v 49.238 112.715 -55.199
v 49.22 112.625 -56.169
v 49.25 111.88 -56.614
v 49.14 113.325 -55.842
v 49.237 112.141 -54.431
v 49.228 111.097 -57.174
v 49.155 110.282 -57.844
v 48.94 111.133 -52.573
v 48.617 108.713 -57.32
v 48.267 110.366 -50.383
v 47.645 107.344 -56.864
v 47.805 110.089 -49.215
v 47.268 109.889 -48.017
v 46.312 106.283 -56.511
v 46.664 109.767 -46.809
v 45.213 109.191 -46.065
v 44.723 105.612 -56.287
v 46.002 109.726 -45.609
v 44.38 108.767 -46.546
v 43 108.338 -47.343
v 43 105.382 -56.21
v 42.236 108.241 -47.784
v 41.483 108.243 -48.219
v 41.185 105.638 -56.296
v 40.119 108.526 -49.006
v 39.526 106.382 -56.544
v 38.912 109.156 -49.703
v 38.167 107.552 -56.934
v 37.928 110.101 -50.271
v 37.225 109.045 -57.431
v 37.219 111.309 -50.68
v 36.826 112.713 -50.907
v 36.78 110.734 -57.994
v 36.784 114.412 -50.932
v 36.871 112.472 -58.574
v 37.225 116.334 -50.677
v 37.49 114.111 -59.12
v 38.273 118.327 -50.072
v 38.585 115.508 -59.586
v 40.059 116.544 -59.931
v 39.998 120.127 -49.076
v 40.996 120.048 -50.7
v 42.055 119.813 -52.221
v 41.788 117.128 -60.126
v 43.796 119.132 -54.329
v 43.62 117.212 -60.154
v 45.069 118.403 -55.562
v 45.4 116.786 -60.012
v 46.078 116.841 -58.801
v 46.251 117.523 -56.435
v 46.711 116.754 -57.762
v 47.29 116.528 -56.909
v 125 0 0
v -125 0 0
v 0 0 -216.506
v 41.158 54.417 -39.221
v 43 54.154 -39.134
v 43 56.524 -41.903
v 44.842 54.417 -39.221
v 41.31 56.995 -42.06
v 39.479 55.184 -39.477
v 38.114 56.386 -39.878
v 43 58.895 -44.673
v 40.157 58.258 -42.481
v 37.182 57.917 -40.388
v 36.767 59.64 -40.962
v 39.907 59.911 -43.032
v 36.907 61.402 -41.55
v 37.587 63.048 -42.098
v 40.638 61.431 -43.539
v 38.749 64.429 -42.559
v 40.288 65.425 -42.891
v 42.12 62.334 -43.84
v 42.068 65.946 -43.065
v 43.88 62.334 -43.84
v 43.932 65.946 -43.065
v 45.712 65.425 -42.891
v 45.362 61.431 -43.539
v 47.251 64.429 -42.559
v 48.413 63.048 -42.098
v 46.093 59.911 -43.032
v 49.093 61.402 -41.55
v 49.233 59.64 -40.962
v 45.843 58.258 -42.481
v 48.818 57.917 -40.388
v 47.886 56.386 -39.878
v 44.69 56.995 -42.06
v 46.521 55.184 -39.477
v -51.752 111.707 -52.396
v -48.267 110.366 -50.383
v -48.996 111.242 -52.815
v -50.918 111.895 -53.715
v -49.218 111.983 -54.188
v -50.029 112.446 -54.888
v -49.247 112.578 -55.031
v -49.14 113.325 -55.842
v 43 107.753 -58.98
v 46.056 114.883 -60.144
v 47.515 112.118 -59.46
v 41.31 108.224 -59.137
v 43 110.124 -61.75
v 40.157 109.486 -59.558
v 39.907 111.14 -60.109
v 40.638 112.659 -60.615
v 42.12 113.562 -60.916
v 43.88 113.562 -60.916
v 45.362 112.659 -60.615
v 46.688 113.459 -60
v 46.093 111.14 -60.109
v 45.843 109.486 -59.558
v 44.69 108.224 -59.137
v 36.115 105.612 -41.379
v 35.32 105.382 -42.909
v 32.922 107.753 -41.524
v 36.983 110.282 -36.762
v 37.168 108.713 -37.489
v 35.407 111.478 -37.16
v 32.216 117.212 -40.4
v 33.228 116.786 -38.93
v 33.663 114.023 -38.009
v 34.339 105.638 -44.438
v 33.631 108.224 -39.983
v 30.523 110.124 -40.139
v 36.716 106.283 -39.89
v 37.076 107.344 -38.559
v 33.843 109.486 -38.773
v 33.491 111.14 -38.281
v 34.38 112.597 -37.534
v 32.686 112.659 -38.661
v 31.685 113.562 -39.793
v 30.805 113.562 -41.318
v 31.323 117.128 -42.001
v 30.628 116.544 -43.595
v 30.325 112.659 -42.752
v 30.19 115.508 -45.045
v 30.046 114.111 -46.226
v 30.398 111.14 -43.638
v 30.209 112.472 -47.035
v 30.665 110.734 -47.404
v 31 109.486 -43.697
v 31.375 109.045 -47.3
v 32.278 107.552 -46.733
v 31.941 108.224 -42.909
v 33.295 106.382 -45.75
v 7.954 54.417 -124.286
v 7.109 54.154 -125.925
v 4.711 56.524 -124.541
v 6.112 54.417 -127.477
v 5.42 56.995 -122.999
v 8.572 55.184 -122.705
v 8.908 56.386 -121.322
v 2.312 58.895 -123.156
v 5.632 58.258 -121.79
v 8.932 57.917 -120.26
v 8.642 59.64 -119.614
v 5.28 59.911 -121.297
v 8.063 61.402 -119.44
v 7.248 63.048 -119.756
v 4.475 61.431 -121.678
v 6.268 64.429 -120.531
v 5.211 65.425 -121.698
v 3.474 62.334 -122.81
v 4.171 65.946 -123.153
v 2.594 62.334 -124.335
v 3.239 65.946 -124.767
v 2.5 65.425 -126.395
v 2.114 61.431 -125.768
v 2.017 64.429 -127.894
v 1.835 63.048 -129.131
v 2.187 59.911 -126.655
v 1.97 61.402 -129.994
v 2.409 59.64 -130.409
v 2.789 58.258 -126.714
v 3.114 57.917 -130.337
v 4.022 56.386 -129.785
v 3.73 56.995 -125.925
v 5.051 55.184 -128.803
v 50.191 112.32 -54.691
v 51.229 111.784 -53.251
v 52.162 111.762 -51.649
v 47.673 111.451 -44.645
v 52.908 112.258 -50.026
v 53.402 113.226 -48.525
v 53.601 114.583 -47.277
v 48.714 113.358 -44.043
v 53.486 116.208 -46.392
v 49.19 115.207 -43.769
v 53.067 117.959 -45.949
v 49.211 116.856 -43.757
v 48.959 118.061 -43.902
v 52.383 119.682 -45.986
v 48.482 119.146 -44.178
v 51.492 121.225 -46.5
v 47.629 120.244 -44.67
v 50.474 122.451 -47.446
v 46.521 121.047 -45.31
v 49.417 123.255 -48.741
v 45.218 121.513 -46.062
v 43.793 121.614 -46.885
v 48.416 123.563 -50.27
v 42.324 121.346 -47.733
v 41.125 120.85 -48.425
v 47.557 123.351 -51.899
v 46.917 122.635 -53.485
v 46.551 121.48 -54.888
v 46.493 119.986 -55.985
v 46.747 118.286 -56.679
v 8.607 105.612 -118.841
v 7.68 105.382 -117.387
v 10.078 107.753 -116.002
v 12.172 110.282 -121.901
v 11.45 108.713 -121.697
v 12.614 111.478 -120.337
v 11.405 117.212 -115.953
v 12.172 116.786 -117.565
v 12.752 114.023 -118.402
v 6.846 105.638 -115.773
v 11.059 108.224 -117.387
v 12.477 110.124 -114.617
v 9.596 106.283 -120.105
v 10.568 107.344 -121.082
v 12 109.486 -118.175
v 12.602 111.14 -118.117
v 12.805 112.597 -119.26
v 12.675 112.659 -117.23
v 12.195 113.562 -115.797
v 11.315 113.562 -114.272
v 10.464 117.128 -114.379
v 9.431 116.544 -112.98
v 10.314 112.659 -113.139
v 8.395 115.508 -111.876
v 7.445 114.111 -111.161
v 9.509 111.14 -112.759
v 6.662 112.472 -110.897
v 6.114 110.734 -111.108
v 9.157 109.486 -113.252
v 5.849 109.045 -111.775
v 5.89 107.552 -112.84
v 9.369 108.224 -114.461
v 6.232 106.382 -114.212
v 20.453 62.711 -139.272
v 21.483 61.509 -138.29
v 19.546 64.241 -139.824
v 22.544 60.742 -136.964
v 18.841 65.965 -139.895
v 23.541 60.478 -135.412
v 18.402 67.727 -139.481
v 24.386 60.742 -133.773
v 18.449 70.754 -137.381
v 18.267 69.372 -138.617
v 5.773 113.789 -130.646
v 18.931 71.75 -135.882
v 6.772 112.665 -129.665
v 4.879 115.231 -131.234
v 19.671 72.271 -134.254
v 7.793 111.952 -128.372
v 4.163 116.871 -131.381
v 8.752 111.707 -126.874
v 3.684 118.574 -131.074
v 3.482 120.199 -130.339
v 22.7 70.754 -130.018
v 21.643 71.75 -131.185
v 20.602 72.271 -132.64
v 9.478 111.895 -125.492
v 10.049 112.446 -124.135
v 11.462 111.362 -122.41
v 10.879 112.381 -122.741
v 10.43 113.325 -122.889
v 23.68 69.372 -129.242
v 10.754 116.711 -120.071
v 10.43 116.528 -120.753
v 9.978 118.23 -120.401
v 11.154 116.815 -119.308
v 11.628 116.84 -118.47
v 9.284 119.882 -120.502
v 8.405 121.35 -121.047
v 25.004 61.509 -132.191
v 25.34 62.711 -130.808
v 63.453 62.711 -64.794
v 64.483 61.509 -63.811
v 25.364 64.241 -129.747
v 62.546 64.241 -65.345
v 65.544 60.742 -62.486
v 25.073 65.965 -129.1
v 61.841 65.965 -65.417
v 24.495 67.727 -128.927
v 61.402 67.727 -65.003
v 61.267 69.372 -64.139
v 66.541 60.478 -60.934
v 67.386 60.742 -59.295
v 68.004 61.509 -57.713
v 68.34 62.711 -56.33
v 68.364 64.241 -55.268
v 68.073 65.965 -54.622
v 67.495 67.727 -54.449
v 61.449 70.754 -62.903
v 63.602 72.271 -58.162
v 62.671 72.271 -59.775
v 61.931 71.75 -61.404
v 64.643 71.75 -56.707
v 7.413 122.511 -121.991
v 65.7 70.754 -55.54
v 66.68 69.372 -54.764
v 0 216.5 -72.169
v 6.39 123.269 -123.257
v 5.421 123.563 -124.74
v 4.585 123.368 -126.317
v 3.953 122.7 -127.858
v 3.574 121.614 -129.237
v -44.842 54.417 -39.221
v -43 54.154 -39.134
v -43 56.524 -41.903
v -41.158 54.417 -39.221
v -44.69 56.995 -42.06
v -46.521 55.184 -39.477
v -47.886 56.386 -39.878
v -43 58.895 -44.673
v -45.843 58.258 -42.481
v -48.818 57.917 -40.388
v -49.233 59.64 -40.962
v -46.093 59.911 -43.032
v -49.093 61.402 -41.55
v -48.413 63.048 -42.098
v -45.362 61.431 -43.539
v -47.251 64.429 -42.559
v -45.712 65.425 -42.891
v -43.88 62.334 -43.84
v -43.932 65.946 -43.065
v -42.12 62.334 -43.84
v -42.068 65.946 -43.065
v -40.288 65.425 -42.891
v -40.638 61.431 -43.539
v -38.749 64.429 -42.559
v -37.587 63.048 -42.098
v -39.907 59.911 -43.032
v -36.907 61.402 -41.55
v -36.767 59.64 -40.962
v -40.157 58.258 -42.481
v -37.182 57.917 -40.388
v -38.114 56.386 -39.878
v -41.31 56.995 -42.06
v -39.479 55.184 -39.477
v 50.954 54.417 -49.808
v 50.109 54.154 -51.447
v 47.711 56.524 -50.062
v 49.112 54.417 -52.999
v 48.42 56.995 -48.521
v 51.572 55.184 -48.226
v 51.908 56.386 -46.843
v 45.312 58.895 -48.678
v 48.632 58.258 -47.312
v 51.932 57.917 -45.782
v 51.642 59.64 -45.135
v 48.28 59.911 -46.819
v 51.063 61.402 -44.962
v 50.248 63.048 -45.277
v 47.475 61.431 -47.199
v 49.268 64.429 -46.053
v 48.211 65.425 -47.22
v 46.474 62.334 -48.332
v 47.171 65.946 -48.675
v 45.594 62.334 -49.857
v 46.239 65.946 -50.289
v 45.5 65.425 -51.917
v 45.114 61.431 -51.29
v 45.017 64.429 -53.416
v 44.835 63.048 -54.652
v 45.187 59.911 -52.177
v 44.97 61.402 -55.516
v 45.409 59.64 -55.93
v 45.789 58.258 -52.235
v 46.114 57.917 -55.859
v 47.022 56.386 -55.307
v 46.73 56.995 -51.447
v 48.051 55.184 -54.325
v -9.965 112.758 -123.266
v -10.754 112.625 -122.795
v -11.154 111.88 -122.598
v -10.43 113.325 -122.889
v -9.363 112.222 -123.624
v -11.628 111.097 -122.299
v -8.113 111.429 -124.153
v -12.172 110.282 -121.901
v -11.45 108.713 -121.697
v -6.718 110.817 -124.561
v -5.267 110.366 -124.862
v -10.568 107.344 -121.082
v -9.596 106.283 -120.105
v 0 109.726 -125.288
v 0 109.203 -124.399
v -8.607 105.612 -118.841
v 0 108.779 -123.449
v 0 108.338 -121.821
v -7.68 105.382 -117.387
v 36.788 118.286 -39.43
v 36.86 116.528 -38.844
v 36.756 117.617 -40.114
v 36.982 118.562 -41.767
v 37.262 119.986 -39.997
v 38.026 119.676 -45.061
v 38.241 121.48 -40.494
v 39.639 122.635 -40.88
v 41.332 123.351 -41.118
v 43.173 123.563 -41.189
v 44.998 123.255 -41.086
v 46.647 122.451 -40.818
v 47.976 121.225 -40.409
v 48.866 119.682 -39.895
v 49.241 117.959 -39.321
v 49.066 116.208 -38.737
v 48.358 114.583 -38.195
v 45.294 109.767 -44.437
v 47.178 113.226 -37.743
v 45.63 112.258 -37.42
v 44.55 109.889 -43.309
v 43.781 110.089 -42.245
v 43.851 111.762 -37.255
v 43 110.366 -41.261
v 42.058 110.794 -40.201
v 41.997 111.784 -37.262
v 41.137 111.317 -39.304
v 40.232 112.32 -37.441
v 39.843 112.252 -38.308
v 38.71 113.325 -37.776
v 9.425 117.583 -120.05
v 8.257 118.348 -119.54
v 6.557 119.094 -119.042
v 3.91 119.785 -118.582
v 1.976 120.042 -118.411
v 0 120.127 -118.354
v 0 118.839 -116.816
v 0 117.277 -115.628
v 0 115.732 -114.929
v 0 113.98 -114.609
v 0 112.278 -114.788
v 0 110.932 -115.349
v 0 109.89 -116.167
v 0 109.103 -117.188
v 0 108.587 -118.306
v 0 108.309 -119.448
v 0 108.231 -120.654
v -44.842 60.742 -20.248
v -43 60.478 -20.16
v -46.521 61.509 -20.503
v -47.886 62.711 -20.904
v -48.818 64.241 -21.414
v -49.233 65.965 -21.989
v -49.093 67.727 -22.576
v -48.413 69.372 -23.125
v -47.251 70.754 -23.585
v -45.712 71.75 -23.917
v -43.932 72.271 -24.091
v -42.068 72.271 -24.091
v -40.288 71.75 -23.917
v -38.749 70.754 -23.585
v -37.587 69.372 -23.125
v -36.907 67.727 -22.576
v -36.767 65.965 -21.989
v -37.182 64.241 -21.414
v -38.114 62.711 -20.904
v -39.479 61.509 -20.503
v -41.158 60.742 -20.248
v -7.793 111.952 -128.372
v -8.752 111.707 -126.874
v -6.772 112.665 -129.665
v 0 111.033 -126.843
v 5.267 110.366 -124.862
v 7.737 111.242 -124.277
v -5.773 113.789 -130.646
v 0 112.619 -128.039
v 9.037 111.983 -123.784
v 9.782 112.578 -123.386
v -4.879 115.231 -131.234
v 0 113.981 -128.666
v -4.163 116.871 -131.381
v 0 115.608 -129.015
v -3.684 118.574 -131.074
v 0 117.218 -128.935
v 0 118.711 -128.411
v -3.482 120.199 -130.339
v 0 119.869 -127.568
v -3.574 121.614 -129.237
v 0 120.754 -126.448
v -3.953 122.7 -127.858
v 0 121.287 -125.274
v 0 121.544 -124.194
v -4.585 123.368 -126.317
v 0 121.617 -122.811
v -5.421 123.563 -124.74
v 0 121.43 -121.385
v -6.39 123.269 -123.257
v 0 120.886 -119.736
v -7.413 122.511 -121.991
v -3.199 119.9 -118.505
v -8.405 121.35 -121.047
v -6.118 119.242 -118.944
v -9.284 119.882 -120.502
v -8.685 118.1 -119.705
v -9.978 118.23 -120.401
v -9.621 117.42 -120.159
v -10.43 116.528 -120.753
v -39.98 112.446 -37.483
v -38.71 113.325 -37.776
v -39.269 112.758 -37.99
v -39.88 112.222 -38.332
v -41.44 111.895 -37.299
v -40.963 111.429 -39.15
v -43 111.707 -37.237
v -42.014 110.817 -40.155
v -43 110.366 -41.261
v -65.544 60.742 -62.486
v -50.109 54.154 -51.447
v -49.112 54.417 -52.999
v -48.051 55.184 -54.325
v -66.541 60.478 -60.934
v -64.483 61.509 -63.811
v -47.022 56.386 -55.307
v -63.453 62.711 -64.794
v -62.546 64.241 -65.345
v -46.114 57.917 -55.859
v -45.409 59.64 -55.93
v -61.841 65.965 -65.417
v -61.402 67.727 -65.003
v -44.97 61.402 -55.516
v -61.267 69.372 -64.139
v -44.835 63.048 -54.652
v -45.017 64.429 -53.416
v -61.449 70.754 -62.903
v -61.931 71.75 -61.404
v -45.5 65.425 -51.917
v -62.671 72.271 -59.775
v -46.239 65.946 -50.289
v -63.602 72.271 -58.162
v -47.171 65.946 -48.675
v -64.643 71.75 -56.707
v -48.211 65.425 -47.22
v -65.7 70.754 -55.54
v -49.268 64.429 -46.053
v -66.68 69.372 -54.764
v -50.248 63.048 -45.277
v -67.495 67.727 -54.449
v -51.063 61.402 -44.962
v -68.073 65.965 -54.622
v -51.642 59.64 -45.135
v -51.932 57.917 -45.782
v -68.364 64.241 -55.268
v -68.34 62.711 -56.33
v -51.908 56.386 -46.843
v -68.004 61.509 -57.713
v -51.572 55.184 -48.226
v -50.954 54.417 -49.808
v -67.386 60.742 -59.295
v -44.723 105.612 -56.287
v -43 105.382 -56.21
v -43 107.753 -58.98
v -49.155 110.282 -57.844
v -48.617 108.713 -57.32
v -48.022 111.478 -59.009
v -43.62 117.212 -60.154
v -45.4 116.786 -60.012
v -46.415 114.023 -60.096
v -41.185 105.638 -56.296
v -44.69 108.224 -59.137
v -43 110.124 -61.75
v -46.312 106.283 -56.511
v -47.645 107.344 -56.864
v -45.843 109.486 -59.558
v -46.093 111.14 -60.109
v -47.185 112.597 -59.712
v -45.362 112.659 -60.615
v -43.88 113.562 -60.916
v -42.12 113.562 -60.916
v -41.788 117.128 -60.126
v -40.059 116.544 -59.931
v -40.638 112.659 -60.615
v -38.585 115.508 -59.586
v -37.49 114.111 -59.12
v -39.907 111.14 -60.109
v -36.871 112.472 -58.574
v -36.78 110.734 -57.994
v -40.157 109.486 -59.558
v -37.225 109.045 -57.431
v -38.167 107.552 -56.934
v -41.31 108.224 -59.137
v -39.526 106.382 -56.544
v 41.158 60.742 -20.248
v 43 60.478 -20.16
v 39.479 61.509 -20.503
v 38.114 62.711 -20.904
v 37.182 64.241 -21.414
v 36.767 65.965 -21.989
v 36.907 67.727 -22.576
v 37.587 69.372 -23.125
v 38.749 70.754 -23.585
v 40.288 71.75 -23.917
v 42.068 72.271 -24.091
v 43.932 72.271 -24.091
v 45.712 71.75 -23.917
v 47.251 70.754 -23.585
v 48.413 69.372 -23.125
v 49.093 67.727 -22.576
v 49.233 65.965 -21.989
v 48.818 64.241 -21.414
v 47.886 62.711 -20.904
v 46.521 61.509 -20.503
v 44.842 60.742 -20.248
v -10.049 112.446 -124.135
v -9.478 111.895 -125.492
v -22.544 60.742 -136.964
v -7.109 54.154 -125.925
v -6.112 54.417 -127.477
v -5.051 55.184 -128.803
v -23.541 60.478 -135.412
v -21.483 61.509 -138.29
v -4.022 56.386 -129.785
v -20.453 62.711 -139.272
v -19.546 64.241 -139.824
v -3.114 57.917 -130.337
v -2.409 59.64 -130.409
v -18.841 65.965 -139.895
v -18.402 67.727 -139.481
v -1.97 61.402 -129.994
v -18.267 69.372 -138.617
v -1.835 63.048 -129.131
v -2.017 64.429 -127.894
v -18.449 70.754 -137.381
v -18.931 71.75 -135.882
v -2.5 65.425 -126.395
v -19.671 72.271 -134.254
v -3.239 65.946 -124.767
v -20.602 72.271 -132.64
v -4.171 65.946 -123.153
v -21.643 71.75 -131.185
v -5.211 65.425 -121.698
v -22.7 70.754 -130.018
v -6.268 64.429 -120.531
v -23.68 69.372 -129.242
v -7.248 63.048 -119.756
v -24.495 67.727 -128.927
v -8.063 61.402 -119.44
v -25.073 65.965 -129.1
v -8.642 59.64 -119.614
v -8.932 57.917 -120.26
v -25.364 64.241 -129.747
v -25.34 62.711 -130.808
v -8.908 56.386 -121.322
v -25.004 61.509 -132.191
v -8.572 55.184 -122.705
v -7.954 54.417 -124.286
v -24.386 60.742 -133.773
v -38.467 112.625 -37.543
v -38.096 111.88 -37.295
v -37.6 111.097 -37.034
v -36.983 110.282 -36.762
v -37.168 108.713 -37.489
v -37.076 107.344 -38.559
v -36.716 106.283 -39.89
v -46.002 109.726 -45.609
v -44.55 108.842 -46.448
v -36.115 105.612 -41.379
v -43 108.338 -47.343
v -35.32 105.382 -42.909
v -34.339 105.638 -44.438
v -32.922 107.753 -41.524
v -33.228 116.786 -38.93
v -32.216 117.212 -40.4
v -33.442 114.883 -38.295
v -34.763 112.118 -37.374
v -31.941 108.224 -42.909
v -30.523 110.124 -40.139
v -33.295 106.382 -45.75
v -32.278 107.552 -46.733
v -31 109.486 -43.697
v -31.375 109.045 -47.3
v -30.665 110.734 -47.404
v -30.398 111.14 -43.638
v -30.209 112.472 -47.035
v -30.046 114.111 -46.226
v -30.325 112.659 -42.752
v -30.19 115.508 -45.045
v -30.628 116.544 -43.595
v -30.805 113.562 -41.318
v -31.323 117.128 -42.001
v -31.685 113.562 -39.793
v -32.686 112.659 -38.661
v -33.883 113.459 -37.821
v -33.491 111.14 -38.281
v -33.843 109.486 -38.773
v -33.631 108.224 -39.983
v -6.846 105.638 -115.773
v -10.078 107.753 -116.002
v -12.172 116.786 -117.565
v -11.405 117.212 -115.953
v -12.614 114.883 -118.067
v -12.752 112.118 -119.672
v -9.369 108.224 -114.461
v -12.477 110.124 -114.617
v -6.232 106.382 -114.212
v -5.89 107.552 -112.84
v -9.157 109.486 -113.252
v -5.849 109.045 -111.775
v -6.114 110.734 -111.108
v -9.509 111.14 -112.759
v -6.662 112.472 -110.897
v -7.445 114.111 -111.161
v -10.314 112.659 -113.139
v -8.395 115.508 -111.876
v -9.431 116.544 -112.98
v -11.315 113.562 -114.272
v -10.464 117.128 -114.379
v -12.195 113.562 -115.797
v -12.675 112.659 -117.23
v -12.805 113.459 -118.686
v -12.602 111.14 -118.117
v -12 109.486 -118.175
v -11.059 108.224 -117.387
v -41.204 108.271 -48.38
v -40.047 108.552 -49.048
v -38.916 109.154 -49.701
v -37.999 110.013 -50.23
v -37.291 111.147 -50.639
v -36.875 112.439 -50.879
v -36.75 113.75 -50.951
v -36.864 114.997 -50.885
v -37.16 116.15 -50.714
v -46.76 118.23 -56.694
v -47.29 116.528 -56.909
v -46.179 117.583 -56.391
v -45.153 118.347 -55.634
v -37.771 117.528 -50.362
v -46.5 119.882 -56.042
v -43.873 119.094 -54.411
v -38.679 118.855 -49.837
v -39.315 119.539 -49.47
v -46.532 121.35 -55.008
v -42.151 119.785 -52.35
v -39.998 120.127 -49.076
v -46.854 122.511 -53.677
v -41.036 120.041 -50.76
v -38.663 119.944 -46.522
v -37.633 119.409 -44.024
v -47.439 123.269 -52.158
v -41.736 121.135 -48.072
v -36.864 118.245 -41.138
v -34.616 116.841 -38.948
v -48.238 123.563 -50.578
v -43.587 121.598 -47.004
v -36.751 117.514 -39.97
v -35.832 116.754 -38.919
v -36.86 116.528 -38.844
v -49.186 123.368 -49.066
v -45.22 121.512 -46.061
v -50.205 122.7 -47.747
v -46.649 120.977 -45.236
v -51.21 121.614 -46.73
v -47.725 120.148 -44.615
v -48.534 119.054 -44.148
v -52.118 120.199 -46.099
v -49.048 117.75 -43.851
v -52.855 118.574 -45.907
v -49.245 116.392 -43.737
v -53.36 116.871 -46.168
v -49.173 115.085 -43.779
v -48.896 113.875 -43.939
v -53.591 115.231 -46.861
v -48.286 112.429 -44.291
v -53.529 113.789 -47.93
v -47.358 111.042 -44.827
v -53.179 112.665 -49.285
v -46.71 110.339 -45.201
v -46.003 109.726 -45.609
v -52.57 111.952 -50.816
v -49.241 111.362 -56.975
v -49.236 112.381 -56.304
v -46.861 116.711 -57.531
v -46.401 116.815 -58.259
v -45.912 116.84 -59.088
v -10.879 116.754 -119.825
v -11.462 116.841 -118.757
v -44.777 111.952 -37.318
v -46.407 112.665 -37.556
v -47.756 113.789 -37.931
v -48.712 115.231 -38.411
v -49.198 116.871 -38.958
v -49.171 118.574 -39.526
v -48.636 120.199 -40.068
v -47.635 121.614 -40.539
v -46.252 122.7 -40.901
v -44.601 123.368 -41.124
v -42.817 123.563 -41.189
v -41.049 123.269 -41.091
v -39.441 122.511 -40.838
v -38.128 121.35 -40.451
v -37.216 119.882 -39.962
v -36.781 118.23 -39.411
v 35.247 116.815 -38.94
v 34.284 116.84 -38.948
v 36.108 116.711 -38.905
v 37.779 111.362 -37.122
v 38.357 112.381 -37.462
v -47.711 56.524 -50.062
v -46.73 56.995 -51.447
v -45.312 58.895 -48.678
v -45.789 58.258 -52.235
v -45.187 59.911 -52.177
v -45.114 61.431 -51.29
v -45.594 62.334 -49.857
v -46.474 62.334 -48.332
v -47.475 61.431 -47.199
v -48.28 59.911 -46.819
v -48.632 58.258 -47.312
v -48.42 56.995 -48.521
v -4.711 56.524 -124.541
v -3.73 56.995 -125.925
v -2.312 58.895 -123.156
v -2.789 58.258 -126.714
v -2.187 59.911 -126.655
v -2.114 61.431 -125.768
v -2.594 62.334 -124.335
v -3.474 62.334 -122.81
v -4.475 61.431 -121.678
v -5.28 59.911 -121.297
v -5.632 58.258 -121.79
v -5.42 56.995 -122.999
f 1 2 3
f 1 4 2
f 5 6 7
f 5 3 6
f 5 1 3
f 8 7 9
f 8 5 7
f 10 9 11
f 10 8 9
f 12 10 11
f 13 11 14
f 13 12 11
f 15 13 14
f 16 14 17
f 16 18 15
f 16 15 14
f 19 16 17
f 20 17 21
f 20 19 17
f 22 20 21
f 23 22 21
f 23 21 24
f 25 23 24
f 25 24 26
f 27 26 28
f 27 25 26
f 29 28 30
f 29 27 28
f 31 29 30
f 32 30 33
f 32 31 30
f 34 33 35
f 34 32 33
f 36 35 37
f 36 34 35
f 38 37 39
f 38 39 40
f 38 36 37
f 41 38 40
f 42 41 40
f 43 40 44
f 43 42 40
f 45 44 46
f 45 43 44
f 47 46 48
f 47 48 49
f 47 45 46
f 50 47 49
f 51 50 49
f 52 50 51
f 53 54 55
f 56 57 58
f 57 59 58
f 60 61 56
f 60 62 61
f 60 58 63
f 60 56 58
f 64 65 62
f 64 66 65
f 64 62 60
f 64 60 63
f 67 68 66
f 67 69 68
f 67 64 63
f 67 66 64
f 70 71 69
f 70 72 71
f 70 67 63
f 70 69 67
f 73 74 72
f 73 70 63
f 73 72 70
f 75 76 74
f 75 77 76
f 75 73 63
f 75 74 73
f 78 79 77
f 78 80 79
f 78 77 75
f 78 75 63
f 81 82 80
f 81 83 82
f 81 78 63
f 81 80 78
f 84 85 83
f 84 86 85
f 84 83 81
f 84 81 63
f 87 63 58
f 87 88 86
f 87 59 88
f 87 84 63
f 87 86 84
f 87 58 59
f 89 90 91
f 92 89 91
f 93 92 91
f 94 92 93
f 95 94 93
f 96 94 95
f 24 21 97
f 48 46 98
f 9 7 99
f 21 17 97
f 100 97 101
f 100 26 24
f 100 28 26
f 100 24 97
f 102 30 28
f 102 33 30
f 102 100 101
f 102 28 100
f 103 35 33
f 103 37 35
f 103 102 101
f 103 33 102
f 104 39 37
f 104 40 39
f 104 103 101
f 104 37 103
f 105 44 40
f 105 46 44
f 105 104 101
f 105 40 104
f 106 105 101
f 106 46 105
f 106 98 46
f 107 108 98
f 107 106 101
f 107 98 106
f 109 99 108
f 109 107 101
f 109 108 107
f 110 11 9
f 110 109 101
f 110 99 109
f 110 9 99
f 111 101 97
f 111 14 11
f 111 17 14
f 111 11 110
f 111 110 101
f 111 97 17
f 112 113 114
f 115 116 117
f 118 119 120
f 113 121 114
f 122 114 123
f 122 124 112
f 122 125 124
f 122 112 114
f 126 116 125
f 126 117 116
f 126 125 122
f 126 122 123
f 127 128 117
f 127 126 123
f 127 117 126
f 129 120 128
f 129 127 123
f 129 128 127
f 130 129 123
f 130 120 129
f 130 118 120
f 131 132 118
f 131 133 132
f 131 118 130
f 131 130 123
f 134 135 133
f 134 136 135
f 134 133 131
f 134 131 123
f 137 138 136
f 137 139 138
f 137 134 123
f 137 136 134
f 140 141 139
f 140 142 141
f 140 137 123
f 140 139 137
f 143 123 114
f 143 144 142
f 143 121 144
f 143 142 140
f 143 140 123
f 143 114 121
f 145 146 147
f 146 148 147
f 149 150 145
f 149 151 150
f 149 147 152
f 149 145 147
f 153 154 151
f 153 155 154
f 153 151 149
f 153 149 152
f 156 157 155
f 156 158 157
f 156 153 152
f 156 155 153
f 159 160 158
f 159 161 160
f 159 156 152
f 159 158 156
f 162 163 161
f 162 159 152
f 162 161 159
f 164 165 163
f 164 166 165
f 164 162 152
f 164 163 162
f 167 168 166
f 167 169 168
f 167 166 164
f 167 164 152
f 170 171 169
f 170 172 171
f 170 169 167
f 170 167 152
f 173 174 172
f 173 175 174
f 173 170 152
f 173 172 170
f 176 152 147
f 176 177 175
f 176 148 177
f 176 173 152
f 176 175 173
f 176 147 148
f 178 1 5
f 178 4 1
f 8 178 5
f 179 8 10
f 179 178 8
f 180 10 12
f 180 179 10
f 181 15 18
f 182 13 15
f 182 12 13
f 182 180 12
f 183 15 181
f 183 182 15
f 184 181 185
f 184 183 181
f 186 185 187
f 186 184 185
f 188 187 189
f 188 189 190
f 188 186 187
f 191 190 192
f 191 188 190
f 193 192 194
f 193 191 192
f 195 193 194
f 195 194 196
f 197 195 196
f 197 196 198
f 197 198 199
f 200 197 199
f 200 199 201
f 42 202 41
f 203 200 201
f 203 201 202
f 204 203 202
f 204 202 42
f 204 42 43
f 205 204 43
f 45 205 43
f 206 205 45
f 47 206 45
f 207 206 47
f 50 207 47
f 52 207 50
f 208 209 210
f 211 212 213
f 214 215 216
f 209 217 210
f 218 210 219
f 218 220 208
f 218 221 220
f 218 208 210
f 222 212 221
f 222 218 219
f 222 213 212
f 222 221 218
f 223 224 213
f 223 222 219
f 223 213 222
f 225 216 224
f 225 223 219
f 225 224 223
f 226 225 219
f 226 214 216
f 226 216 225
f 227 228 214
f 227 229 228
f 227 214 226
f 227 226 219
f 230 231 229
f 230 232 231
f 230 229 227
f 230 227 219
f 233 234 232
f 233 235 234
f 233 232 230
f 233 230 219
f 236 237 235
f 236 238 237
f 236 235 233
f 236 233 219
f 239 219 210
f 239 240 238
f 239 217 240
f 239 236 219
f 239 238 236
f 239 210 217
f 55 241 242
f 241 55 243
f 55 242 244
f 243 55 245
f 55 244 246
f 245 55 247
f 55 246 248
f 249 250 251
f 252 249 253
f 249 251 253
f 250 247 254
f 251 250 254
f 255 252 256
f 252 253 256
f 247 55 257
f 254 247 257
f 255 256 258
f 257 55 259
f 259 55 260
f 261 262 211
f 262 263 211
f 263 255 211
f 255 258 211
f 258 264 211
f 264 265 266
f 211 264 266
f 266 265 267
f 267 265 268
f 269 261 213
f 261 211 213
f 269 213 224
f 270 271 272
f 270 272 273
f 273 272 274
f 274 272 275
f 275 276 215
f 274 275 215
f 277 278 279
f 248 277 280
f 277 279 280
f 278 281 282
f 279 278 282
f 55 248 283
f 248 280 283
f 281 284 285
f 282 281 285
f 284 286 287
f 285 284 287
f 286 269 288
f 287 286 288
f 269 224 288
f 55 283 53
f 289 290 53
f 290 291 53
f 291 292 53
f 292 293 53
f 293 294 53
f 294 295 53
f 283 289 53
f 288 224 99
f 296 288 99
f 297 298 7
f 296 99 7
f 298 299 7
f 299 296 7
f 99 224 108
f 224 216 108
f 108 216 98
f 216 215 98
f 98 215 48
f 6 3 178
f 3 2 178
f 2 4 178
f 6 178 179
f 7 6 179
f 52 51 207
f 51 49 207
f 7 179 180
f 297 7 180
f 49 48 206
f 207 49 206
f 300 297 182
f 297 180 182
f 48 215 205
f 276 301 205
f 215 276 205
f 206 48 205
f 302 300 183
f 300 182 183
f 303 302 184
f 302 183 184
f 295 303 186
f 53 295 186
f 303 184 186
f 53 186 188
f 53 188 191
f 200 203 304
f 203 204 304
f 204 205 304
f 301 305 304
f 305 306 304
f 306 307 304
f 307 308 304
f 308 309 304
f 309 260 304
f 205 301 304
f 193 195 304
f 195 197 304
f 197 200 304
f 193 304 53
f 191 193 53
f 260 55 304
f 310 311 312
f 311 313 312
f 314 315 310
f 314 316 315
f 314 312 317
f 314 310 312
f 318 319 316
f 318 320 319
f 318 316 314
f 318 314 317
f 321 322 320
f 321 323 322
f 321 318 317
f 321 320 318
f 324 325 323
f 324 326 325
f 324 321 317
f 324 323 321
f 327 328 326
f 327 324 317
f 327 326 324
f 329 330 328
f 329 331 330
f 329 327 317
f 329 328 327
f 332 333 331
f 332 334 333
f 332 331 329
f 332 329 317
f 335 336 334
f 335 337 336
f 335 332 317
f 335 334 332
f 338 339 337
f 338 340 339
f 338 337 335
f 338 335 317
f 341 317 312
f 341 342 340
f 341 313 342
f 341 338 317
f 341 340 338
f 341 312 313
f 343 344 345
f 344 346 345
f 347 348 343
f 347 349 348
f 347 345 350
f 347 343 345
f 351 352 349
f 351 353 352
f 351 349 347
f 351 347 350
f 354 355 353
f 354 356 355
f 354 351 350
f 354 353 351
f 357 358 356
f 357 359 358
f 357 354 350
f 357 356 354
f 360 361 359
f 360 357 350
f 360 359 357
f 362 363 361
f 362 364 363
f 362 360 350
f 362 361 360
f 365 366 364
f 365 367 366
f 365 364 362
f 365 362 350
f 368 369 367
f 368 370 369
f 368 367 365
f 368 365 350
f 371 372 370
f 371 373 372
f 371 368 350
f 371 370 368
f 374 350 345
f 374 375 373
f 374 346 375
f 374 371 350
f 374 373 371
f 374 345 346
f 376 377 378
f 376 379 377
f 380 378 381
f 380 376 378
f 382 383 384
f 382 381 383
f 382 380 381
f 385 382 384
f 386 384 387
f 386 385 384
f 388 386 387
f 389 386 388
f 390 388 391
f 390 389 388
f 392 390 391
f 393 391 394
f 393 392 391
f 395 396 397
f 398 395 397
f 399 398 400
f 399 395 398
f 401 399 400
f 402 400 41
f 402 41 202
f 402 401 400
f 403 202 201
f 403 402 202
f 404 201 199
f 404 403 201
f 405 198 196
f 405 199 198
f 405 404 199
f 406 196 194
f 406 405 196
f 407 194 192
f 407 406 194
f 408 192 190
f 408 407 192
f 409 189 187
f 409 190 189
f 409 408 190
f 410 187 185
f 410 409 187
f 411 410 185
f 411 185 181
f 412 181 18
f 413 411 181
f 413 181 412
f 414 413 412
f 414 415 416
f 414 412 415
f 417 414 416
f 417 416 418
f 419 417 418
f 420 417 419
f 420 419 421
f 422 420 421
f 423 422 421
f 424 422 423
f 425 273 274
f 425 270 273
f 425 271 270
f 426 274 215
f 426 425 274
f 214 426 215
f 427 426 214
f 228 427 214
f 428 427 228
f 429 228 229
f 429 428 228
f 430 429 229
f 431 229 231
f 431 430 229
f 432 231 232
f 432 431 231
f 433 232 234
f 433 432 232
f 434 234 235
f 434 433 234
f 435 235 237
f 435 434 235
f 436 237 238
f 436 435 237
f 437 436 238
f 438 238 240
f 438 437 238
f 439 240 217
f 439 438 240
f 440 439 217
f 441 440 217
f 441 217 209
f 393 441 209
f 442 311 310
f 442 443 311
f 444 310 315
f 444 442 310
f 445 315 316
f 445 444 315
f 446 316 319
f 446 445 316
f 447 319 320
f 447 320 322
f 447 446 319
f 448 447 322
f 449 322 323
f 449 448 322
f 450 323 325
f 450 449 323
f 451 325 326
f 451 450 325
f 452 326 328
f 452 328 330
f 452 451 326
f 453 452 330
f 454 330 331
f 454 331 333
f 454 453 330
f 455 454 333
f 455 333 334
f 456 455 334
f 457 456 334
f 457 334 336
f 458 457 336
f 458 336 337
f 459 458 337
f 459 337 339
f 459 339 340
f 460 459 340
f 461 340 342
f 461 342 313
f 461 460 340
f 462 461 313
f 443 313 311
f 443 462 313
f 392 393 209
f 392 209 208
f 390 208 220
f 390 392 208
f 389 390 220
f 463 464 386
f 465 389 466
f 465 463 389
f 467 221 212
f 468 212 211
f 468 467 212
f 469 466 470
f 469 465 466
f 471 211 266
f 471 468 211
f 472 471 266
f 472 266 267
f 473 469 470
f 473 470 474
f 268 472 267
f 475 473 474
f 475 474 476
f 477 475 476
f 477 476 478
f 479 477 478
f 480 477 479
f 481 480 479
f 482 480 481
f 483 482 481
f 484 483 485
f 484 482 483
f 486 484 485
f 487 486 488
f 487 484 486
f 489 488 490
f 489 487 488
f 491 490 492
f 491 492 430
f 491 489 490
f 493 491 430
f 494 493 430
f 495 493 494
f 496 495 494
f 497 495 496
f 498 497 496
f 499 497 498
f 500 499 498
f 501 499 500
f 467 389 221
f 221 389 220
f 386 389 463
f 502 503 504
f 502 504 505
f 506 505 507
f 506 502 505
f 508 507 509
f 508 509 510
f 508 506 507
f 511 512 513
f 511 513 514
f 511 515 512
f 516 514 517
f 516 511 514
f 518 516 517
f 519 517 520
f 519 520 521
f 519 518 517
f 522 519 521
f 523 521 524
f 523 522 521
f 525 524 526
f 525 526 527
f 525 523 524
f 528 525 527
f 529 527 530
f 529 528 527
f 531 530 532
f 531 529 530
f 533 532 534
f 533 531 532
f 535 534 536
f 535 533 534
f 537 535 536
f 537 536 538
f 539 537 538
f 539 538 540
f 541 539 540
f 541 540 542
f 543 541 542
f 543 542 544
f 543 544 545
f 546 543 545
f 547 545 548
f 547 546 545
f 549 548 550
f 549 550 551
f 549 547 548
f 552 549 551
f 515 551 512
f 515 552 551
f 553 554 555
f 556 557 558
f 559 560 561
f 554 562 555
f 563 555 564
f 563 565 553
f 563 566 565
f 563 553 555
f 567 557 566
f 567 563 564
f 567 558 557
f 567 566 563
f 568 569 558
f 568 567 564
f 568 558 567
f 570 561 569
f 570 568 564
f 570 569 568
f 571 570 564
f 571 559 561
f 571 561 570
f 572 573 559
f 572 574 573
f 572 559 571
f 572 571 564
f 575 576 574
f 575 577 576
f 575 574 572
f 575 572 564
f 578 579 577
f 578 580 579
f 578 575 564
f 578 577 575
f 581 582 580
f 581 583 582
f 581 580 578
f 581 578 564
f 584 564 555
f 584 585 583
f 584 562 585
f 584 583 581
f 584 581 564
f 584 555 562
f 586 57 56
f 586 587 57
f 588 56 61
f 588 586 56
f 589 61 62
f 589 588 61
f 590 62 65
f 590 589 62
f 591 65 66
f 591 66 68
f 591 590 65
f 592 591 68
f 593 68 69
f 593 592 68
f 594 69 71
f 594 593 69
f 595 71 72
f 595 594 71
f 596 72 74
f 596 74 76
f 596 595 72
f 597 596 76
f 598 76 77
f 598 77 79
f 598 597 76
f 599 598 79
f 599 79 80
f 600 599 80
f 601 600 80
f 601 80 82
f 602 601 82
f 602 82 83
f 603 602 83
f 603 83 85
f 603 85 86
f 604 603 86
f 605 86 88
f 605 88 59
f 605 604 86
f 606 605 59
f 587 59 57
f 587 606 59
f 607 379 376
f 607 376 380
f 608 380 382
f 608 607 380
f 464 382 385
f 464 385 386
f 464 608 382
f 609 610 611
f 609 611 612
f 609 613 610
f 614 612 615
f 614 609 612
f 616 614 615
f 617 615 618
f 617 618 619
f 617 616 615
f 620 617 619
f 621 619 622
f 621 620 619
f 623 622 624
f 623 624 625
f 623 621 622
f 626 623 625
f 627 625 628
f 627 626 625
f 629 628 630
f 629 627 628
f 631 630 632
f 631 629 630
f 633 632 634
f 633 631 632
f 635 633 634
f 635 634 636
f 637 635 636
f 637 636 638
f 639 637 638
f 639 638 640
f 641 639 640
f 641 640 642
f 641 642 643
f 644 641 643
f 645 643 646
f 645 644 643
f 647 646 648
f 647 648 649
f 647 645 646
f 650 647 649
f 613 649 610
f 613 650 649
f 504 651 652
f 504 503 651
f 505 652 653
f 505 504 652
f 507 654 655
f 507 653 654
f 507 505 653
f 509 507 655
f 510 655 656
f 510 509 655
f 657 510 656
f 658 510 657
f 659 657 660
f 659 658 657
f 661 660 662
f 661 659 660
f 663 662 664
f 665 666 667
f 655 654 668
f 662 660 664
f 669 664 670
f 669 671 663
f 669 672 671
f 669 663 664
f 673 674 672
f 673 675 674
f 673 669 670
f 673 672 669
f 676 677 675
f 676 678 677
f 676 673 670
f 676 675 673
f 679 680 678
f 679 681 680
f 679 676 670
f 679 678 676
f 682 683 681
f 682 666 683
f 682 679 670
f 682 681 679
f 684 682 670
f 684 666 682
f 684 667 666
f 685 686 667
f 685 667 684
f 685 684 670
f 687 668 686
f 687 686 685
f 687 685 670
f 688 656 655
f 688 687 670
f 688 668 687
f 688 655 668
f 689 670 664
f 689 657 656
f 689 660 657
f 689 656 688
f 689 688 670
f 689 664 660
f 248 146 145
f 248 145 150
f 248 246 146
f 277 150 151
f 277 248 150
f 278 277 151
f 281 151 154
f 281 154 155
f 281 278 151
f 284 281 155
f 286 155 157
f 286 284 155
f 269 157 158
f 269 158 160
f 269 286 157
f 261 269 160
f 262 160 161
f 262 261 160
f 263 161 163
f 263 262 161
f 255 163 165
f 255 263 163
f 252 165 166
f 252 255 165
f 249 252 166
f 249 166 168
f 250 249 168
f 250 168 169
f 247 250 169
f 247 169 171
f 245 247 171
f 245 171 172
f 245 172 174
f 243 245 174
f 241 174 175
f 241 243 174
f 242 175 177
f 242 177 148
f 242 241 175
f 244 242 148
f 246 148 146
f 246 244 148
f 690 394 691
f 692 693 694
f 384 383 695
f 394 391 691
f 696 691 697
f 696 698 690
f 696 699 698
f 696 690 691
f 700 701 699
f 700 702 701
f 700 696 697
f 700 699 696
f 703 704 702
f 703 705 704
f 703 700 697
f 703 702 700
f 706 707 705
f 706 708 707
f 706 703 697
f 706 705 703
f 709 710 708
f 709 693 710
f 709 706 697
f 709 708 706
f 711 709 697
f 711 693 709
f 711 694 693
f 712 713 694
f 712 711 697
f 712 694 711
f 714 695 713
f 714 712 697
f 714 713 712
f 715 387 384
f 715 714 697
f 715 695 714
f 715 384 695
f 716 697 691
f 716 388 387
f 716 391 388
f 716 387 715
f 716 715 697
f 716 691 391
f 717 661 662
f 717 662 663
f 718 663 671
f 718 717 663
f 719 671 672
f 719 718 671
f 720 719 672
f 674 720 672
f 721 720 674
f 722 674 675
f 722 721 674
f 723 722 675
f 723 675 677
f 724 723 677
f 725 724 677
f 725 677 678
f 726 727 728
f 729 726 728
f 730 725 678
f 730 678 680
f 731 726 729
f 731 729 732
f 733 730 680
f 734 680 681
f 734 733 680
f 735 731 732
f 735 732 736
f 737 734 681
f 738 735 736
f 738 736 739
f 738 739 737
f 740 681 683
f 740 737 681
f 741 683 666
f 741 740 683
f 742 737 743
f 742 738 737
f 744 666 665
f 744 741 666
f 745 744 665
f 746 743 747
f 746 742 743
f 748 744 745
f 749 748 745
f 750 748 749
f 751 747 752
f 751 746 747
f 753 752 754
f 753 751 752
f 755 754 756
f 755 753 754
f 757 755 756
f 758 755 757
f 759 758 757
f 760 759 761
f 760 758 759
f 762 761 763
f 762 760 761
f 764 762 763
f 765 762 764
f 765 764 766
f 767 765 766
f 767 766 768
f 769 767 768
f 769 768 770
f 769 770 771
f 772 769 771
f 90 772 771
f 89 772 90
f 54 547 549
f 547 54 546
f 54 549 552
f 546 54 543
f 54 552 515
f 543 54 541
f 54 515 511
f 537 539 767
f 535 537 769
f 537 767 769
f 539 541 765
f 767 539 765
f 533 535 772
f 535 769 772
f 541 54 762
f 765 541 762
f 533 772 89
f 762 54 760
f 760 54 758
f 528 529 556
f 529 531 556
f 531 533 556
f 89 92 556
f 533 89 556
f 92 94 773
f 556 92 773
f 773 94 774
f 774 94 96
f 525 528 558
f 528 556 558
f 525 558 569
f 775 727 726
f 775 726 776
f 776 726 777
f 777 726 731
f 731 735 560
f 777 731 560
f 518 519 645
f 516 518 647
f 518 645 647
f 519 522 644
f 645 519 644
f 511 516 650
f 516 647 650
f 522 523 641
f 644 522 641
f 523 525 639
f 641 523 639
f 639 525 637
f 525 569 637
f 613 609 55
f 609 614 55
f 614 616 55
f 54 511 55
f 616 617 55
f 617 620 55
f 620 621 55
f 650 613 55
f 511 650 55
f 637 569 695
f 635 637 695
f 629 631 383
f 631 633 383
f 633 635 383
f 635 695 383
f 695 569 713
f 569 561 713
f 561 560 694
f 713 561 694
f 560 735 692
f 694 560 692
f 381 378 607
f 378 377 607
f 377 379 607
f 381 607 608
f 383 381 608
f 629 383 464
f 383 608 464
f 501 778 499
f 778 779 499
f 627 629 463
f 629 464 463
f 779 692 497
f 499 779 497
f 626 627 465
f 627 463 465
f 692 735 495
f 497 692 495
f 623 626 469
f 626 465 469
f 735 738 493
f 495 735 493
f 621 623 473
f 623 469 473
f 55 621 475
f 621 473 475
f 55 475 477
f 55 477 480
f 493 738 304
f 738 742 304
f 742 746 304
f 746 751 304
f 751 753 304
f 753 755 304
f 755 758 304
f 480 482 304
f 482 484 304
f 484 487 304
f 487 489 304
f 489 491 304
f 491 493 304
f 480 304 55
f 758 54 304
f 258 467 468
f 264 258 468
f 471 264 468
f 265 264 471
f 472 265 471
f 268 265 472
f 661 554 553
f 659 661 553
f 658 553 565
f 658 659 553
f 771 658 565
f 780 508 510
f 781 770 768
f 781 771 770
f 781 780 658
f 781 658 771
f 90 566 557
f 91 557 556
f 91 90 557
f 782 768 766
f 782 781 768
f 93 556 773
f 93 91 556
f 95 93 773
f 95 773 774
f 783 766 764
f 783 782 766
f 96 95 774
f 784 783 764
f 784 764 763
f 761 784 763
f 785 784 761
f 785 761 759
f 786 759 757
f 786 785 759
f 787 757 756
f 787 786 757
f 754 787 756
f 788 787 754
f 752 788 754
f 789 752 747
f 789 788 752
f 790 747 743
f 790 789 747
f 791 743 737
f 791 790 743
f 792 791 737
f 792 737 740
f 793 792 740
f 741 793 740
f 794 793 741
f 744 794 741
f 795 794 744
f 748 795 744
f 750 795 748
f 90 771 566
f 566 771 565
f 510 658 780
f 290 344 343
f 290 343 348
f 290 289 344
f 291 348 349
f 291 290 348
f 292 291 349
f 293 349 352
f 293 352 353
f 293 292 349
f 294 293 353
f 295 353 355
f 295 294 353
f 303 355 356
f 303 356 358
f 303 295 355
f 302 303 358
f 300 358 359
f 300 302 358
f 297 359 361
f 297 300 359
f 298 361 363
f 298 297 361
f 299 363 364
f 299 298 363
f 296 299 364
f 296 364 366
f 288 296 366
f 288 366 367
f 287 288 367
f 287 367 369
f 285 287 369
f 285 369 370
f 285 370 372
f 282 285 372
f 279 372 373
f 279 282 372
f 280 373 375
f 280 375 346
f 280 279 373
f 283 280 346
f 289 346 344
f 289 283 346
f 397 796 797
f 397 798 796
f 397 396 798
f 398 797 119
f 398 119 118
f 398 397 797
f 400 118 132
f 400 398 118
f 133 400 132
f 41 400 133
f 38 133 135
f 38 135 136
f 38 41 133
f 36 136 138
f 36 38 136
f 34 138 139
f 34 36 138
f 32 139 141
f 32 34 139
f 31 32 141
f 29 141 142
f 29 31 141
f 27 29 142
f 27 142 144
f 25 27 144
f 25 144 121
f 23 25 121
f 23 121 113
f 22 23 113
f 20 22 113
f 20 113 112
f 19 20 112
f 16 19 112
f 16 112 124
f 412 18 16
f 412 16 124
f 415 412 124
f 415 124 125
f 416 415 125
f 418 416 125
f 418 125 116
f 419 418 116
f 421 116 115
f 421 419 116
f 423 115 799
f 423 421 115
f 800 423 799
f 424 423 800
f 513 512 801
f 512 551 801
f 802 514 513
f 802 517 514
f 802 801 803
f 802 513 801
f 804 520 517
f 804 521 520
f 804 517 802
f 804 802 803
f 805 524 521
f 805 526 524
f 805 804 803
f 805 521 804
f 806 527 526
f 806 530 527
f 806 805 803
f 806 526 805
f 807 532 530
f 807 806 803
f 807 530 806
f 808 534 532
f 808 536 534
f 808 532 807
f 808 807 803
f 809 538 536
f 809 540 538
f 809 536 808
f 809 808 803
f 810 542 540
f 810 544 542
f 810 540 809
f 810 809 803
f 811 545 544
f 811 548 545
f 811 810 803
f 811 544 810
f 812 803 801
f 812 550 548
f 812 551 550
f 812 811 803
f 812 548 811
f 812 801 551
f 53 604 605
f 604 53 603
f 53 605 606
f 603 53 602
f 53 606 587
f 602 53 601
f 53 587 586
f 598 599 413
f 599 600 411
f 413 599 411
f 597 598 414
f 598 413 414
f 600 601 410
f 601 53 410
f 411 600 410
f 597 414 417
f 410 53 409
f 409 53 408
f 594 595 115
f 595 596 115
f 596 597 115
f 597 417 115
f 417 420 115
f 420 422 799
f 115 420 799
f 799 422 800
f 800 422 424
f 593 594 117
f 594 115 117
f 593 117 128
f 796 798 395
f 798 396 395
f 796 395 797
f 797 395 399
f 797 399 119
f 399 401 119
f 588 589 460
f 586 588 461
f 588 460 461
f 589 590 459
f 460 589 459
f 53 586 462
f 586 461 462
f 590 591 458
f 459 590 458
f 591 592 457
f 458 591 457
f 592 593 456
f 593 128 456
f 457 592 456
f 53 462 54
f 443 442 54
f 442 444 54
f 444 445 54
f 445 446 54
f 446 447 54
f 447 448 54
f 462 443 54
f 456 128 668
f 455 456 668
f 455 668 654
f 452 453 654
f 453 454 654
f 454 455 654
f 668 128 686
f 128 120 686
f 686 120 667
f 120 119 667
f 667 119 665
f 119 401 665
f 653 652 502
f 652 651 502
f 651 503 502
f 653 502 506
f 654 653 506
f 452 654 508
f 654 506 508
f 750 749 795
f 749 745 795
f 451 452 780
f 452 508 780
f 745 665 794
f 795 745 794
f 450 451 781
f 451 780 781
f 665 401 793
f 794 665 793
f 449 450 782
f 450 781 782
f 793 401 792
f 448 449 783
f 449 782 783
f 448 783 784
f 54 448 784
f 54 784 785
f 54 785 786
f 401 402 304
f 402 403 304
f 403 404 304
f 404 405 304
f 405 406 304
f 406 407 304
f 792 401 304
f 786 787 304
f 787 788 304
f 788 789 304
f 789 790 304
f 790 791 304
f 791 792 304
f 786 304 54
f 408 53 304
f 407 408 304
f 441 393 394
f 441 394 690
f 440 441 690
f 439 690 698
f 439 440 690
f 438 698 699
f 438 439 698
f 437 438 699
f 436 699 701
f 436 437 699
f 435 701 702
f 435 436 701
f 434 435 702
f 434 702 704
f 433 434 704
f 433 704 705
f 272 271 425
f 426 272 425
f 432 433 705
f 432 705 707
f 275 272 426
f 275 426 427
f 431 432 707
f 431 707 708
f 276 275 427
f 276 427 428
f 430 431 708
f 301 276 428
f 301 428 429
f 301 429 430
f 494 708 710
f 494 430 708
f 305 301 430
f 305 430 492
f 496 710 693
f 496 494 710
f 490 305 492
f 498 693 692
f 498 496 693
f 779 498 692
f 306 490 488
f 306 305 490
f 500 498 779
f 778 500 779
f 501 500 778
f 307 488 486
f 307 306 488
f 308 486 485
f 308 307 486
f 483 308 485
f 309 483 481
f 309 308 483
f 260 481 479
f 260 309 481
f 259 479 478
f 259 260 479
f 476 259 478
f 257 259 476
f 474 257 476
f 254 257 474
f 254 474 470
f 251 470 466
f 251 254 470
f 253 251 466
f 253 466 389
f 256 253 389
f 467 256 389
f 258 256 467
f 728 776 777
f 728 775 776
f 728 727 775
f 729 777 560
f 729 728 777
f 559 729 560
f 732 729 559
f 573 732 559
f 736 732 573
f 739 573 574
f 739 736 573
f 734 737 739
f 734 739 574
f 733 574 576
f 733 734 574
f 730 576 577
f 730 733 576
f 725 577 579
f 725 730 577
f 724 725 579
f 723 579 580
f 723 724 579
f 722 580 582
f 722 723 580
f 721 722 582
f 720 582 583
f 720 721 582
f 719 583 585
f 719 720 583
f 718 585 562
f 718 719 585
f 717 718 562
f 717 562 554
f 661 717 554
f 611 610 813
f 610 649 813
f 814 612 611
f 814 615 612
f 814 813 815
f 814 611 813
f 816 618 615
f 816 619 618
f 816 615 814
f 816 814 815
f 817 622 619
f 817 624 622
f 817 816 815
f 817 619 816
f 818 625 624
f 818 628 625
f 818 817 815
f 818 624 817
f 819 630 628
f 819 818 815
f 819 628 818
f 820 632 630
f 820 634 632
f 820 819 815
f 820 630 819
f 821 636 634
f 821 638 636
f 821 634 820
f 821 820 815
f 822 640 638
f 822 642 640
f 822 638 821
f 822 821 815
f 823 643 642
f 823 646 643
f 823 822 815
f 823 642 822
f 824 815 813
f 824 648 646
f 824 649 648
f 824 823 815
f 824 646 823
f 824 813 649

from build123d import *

# Parameters (mm, degrees)
M14X1_5_1_AT_2_COUNT     = 2
M14X1_5_1_AT_2_PITCH     = 86
M14X1_5_1_AT_3_COUNT     = 2
M14X1_5_1_AT_3_PITCH     = 101.548018198
M14X1_5_1_AT_4_COUNT     = 2
M14X1_5_1_AT_4_PITCH     = 54
PATTERN_CIRCULAR_1_COUNT = 3


with BuildPart() as part:
    # 草圖1 → 疊層拉伸1 section 0
    with BuildSketch(Plane(origin=(0, 0, 0), x_dir=(1, 0, 0), z_dir=(0, 1, 0)), mode=Mode.PRIVATE) as loft_1_s0:
        with BuildLine():
            Line((0, 0), (-125, 0))
            Line((-125, 0), (0, 216.506350946))
            Line((0, 216.506350946), (125, 0))
            Line((125, 0), (0, 0))
        make_face()
    loft([loft_1_s0.sketch, Vertex(0, 216.5, -72.168783649)])

    # 草圖3 → M14x1.5 螺紋孔1 (revolve, cut)
    with BuildSketch(Plane(origin=(-43, 117.636383872, -39.21327823), x_dir=(0, -0.9486805150951512, 0.3162361147604725), z_dir=(1, 0, 0))):
        Polygon((0, 0), (0, 23.755378869), (6.25, 20), (6.25, 0), align=None)
    m14x1_5_1 = revolve(axis=Axis((-43, 119.644483201, -33.189156959), (0, -0.31623611476047253, -0.9486805150951512)), mode=Mode.SUBTRACT)

    # M14x1.5 螺紋孔1 at 2: M14x1.5 螺紋孔1 ×2
    with Locations(*[(i * M14X1_5_1_AT_2_PITCH, 0, 0) for i in range(1, M14X1_5_1_AT_2_COUNT)]):
        add(m14x1_5_1, mode=Mode.SUBTRACT)

    # M14x1.5 螺紋孔1 at 3: M14x1.5 螺紋孔1 ×2
    with Locations(*[Vector(0.8468899888530682, -0.5044780658851046, 0.1681642881865052) * (i * M14X1_5_1_AT_3_PITCH) for i in range(1, M14X1_5_1_AT_3_COUNT)]):
        add(m14x1_5_1, mode=Mode.SUBTRACT)

    # M14x1.5 螺紋孔1 at 4: M14x1.5 螺紋孔1 ×2
    with Locations(*[Vector(0, -0.9486805150951512, 0.3162361147604726) * (i * M14X1_5_1_AT_4_PITCH) for i in range(1, M14X1_5_1_AT_4_COUNT)]):
        add(m14x1_5_1, mode=Mode.SUBTRACT)

    # 環狀複製排列1: M14x1.5 螺紋孔1 ×3 about axis
    pattern_circular_1_axis = Axis((0, 216.5, -72.168783649), (0, -1, 0))
    for i in range(1, PATTERN_CIRCULAR_1_COUNT):
        add(m14x1_5_1.rotate(pattern_circular_1_axis, i * 360 / PATTERN_CIRCULAR_1_COUNT), mode=Mode.SUBTRACT)

    # 環狀複製排列1 copy 1 sketch → 環狀複製排列1 copy 1 (revolve, cut)
    with BuildSketch(Plane(origin=(-50.040304887, 117.636383872, -51.407443995), x_dir=(-0.27386850897666026, -0.9486805150951512, -0.15811805738023615), z_dir=(-0.4999999999999998, 0, 0.8660254037844387))):
        Polygon((0, 0), (0, 23.755378869), (6.25, 20), (6.25, 0), align=None)
    revolve(axis=Axis((-55.257346943, 119.644483201, -54.419504631), (0.8215814261477076, -0.31623611476047253, 0.47434025754757536)), mode=Mode.SUBTRACT)

    # 環狀複製排列1 copy 2 sketch → 環狀複製排列1 copy 2 (revolve, cut)
    with BuildSketch(Plane(origin=(7.040304887, 117.636383872, -125.885628721), x_dir=(0.27386850897666015, -0.9486805150951512, -0.15811805738023638), z_dir=(-0.5000000000000004, 0, -0.8660254037844384))):
        Polygon((0, 0), (0, 23.755378869), (6.25, 20), (6.25, 0), align=None)
    revolve(axis=Axis((12.257346943, 119.644483201, -128.897689356), (-0.8215814261477072, -0.31623611476047253, 0.474340257547576)), mode=Mode.SUBTRACT)

    # 環狀複製排列1 copy 3 sketch → 環狀複製排列1 copy 3 (revolve, cut)
    with BuildSketch(Plane(origin=(-64.829204372, 66.407636057, -59.945819094), x_dir=(-0.27386850897666026, -0.9486805150951512, -0.15811805738023615), z_dir=(-0.4999999999999998, 0, 0.8660254037844387))):
        Polygon((0, 0), (0, 23.755378869), (6.25, 20), (6.25, 0), align=None)
    revolve(axis=Axis((-70.046246428, 68.415735385, -62.957879729), (0.8215814261477076, -0.31623611476047253, 0.47434025754757536)), mode=Mode.SUBTRACT)

    # 環狀複製排列1 copy 4 sketch → 環狀複製排列1 copy 4 (revolve, cut)
    with BuildSketch(Plane(origin=(21.829204372, 66.407636057, -134.424003819), x_dir=(0.27386850897666015, -0.9486805150951512, -0.15811805738023638), z_dir=(-0.5000000000000004, 0, -0.8660254037844384))):
        Polygon((0, 0), (0, 23.755378869), (6.25, 20), (6.25, 0), align=None)
    revolve(axis=Axis((27.046246428, 68.415735385, -137.436064455), (-0.8215814261477072, -0.31623611476047253, 0.474340257547576)), mode=Mode.SUBTRACT)

    # 環狀複製排列1 copy 5 sketch → 環狀複製排列1 copy 5 (revolve, cut)
    with BuildSketch(Plane(origin=(-21.829204372, 66.407636057, -134.424003819), x_dir=(-0.27386850897666026, -0.9486805150951512, -0.15811805738023615), z_dir=(-0.4999999999999998, 0, 0.8660254037844387))):
        Polygon((0, 0), (0, 23.755378869), (6.25, 20), (6.25, 0), align=None)
    revolve(axis=Axis((-27.046246428, 68.415735385, -137.436064455), (0.8215814261477076, -0.31623611476047253, 0.47434025754757536)), mode=Mode.SUBTRACT)

    # 環狀複製排列1 copy 6 sketch → 環狀複製排列1 copy 6 (revolve, cut)
    with BuildSketch(Plane(origin=(64.829204372, 66.407636057, -59.945819094), x_dir=(0.27386850897666015, -0.9486805150951512, -0.15811805738023638), z_dir=(-0.5000000000000004, 0, -0.8660254037844384))):
        Polygon((0, 0), (0, 23.755378869), (6.25, 20), (6.25, 0), align=None)
    revolve(axis=Axis((70.046246428, 68.415735385, -62.957879729), (-0.8215814261477072, -0.31623611476047253, 0.474340257547576)), mode=Mode.SUBTRACT)


solid = part.part
